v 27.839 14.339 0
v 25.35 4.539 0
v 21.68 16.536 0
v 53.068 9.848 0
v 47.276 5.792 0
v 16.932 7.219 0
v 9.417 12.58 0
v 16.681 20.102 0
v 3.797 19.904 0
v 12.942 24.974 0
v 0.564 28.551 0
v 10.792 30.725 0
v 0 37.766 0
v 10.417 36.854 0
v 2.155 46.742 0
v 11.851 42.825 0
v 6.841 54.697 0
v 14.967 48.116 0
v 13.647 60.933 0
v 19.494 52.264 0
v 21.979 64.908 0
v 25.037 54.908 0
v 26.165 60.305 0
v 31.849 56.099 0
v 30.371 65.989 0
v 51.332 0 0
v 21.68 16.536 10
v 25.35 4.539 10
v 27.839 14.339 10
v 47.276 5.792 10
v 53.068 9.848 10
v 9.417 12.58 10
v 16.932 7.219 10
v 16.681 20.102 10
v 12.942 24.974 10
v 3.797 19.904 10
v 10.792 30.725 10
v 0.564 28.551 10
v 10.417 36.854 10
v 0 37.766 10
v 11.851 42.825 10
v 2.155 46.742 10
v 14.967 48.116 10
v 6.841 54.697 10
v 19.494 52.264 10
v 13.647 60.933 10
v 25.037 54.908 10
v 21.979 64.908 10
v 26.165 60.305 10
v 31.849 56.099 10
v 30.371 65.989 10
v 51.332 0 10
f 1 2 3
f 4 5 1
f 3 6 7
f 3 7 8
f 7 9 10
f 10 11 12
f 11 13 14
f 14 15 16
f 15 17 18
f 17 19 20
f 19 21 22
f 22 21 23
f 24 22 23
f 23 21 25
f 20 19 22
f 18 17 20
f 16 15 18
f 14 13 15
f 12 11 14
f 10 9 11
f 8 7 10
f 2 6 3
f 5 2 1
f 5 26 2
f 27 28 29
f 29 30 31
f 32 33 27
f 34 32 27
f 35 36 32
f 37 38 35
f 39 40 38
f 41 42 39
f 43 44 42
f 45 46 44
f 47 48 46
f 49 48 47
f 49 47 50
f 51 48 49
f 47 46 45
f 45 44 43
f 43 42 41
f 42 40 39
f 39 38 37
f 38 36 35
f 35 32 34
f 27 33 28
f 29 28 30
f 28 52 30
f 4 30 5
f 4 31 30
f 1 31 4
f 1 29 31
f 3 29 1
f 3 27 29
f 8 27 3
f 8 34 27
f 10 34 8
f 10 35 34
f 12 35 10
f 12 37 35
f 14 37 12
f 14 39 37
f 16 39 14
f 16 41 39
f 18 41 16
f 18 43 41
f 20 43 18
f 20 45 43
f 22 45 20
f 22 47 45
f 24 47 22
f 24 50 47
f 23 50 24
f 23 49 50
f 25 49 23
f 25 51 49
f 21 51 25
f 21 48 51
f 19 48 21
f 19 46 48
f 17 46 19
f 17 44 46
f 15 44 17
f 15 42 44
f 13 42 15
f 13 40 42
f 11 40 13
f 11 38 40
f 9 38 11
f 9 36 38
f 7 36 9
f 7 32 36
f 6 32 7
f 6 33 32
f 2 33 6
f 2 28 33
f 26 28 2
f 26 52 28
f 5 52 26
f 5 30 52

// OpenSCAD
$fn = 32;

// ----------------------------------------------------------------------
// Hook plate: curl radius 26 mm over 170 degrees, 10 mm thick band
// ----------------------------------------------------------------------

// --- parameters (mm) ---
profile_height = 10;      // extrusion height
profile_points = 26;      // points of the closed outline

profile = [[26.165, 60.305], [30.371, 65.989], [21.979, 64.908], [13.647, 60.933], [6.841, 54.697], [2.155, 46.742], [0, 37.766], [0.564, 28.551], [3.797, 19.904], [9.417, 12.58], [16.932, 7.219], [25.35, 4.539], [51.332, 0], [47.276, 5.792], [53.068, 9.848], [27.839, 14.339], [21.68, 16.536], [16.681, 20.102], [12.942, 24.974], [10.792, 30.725], [10.417, 36.854], [11.851, 42.825], [14.967, 48.116], [19.494, 52.264], [25.037, 54.908], [31.849, 56.099]];  // single closed polygon, 26 points, counter clockwise

// --- the one profile operation ---
linear_extrude(height = profile_height) polygon(points = profile);
